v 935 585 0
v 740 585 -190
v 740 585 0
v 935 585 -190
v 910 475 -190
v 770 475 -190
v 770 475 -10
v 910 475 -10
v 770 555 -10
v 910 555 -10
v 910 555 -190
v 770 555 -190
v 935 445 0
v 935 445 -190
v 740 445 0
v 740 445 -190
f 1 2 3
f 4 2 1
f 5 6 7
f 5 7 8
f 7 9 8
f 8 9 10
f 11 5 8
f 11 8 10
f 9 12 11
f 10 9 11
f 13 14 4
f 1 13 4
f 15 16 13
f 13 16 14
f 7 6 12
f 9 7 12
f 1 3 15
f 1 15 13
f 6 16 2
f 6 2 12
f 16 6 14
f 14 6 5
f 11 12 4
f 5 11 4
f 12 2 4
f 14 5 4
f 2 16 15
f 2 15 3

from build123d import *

# Parameters (mm, degrees)
BOX124_W     = 140
BOX124_H     = 80
BOX124_DEPTH = 190
BOX123_W     = 140
BOX123_H     = 80
BOX123_DEPTH = 180
BOX122_W     = 195
BOX122_H     = 140
BOX122_DEPTH = 190


with BuildPart() as cube096:
    # Box124 → Box124 (new body)
    with BuildSketch(Plane(origin=(220, 30, 0), x_dir=(1, 0, 0), z_dir=(0, 0, 1))):
        with Locations((70, 40)):
            Rectangle(BOX124_W, BOX124_H)
    extrude(amount=BOX124_DEPTH)


with BuildPart() as fusion024:
    # Box123 → Box123 (new body)
    with BuildSketch(Plane(origin=(30, 30, 0), x_dir=(1, 0, 0), z_dir=(0, 0, 1))):
        with Locations((70, 40)):
            Rectangle(BOX123_W, BOX123_H)
    extrude(amount=BOX123_DEPTH)

    # Fusion024: union Cube096
    add(cube096.part)


with BuildPart() as halve_snelbouwsteen002:
    # Box122 → Box122 (new body)
    with BuildSketch(Plane.XY):
        with Locations((97.5, 70)):
            Rectangle(BOX122_W, BOX122_H)
    extrude(amount=BOX122_DEPTH)

    # Cut019: cut Fusion024
    add(fusion024.part, mode=Mode.SUBTRACT)


with BuildPart() as halve_snelbouwsteen002_1:
    # Cut019 placement: moved
    add(halve_snelbouwsteen002.part.moved(Location((740, 445, -190))))


solid = halve_snelbouwsteen002_1.part
